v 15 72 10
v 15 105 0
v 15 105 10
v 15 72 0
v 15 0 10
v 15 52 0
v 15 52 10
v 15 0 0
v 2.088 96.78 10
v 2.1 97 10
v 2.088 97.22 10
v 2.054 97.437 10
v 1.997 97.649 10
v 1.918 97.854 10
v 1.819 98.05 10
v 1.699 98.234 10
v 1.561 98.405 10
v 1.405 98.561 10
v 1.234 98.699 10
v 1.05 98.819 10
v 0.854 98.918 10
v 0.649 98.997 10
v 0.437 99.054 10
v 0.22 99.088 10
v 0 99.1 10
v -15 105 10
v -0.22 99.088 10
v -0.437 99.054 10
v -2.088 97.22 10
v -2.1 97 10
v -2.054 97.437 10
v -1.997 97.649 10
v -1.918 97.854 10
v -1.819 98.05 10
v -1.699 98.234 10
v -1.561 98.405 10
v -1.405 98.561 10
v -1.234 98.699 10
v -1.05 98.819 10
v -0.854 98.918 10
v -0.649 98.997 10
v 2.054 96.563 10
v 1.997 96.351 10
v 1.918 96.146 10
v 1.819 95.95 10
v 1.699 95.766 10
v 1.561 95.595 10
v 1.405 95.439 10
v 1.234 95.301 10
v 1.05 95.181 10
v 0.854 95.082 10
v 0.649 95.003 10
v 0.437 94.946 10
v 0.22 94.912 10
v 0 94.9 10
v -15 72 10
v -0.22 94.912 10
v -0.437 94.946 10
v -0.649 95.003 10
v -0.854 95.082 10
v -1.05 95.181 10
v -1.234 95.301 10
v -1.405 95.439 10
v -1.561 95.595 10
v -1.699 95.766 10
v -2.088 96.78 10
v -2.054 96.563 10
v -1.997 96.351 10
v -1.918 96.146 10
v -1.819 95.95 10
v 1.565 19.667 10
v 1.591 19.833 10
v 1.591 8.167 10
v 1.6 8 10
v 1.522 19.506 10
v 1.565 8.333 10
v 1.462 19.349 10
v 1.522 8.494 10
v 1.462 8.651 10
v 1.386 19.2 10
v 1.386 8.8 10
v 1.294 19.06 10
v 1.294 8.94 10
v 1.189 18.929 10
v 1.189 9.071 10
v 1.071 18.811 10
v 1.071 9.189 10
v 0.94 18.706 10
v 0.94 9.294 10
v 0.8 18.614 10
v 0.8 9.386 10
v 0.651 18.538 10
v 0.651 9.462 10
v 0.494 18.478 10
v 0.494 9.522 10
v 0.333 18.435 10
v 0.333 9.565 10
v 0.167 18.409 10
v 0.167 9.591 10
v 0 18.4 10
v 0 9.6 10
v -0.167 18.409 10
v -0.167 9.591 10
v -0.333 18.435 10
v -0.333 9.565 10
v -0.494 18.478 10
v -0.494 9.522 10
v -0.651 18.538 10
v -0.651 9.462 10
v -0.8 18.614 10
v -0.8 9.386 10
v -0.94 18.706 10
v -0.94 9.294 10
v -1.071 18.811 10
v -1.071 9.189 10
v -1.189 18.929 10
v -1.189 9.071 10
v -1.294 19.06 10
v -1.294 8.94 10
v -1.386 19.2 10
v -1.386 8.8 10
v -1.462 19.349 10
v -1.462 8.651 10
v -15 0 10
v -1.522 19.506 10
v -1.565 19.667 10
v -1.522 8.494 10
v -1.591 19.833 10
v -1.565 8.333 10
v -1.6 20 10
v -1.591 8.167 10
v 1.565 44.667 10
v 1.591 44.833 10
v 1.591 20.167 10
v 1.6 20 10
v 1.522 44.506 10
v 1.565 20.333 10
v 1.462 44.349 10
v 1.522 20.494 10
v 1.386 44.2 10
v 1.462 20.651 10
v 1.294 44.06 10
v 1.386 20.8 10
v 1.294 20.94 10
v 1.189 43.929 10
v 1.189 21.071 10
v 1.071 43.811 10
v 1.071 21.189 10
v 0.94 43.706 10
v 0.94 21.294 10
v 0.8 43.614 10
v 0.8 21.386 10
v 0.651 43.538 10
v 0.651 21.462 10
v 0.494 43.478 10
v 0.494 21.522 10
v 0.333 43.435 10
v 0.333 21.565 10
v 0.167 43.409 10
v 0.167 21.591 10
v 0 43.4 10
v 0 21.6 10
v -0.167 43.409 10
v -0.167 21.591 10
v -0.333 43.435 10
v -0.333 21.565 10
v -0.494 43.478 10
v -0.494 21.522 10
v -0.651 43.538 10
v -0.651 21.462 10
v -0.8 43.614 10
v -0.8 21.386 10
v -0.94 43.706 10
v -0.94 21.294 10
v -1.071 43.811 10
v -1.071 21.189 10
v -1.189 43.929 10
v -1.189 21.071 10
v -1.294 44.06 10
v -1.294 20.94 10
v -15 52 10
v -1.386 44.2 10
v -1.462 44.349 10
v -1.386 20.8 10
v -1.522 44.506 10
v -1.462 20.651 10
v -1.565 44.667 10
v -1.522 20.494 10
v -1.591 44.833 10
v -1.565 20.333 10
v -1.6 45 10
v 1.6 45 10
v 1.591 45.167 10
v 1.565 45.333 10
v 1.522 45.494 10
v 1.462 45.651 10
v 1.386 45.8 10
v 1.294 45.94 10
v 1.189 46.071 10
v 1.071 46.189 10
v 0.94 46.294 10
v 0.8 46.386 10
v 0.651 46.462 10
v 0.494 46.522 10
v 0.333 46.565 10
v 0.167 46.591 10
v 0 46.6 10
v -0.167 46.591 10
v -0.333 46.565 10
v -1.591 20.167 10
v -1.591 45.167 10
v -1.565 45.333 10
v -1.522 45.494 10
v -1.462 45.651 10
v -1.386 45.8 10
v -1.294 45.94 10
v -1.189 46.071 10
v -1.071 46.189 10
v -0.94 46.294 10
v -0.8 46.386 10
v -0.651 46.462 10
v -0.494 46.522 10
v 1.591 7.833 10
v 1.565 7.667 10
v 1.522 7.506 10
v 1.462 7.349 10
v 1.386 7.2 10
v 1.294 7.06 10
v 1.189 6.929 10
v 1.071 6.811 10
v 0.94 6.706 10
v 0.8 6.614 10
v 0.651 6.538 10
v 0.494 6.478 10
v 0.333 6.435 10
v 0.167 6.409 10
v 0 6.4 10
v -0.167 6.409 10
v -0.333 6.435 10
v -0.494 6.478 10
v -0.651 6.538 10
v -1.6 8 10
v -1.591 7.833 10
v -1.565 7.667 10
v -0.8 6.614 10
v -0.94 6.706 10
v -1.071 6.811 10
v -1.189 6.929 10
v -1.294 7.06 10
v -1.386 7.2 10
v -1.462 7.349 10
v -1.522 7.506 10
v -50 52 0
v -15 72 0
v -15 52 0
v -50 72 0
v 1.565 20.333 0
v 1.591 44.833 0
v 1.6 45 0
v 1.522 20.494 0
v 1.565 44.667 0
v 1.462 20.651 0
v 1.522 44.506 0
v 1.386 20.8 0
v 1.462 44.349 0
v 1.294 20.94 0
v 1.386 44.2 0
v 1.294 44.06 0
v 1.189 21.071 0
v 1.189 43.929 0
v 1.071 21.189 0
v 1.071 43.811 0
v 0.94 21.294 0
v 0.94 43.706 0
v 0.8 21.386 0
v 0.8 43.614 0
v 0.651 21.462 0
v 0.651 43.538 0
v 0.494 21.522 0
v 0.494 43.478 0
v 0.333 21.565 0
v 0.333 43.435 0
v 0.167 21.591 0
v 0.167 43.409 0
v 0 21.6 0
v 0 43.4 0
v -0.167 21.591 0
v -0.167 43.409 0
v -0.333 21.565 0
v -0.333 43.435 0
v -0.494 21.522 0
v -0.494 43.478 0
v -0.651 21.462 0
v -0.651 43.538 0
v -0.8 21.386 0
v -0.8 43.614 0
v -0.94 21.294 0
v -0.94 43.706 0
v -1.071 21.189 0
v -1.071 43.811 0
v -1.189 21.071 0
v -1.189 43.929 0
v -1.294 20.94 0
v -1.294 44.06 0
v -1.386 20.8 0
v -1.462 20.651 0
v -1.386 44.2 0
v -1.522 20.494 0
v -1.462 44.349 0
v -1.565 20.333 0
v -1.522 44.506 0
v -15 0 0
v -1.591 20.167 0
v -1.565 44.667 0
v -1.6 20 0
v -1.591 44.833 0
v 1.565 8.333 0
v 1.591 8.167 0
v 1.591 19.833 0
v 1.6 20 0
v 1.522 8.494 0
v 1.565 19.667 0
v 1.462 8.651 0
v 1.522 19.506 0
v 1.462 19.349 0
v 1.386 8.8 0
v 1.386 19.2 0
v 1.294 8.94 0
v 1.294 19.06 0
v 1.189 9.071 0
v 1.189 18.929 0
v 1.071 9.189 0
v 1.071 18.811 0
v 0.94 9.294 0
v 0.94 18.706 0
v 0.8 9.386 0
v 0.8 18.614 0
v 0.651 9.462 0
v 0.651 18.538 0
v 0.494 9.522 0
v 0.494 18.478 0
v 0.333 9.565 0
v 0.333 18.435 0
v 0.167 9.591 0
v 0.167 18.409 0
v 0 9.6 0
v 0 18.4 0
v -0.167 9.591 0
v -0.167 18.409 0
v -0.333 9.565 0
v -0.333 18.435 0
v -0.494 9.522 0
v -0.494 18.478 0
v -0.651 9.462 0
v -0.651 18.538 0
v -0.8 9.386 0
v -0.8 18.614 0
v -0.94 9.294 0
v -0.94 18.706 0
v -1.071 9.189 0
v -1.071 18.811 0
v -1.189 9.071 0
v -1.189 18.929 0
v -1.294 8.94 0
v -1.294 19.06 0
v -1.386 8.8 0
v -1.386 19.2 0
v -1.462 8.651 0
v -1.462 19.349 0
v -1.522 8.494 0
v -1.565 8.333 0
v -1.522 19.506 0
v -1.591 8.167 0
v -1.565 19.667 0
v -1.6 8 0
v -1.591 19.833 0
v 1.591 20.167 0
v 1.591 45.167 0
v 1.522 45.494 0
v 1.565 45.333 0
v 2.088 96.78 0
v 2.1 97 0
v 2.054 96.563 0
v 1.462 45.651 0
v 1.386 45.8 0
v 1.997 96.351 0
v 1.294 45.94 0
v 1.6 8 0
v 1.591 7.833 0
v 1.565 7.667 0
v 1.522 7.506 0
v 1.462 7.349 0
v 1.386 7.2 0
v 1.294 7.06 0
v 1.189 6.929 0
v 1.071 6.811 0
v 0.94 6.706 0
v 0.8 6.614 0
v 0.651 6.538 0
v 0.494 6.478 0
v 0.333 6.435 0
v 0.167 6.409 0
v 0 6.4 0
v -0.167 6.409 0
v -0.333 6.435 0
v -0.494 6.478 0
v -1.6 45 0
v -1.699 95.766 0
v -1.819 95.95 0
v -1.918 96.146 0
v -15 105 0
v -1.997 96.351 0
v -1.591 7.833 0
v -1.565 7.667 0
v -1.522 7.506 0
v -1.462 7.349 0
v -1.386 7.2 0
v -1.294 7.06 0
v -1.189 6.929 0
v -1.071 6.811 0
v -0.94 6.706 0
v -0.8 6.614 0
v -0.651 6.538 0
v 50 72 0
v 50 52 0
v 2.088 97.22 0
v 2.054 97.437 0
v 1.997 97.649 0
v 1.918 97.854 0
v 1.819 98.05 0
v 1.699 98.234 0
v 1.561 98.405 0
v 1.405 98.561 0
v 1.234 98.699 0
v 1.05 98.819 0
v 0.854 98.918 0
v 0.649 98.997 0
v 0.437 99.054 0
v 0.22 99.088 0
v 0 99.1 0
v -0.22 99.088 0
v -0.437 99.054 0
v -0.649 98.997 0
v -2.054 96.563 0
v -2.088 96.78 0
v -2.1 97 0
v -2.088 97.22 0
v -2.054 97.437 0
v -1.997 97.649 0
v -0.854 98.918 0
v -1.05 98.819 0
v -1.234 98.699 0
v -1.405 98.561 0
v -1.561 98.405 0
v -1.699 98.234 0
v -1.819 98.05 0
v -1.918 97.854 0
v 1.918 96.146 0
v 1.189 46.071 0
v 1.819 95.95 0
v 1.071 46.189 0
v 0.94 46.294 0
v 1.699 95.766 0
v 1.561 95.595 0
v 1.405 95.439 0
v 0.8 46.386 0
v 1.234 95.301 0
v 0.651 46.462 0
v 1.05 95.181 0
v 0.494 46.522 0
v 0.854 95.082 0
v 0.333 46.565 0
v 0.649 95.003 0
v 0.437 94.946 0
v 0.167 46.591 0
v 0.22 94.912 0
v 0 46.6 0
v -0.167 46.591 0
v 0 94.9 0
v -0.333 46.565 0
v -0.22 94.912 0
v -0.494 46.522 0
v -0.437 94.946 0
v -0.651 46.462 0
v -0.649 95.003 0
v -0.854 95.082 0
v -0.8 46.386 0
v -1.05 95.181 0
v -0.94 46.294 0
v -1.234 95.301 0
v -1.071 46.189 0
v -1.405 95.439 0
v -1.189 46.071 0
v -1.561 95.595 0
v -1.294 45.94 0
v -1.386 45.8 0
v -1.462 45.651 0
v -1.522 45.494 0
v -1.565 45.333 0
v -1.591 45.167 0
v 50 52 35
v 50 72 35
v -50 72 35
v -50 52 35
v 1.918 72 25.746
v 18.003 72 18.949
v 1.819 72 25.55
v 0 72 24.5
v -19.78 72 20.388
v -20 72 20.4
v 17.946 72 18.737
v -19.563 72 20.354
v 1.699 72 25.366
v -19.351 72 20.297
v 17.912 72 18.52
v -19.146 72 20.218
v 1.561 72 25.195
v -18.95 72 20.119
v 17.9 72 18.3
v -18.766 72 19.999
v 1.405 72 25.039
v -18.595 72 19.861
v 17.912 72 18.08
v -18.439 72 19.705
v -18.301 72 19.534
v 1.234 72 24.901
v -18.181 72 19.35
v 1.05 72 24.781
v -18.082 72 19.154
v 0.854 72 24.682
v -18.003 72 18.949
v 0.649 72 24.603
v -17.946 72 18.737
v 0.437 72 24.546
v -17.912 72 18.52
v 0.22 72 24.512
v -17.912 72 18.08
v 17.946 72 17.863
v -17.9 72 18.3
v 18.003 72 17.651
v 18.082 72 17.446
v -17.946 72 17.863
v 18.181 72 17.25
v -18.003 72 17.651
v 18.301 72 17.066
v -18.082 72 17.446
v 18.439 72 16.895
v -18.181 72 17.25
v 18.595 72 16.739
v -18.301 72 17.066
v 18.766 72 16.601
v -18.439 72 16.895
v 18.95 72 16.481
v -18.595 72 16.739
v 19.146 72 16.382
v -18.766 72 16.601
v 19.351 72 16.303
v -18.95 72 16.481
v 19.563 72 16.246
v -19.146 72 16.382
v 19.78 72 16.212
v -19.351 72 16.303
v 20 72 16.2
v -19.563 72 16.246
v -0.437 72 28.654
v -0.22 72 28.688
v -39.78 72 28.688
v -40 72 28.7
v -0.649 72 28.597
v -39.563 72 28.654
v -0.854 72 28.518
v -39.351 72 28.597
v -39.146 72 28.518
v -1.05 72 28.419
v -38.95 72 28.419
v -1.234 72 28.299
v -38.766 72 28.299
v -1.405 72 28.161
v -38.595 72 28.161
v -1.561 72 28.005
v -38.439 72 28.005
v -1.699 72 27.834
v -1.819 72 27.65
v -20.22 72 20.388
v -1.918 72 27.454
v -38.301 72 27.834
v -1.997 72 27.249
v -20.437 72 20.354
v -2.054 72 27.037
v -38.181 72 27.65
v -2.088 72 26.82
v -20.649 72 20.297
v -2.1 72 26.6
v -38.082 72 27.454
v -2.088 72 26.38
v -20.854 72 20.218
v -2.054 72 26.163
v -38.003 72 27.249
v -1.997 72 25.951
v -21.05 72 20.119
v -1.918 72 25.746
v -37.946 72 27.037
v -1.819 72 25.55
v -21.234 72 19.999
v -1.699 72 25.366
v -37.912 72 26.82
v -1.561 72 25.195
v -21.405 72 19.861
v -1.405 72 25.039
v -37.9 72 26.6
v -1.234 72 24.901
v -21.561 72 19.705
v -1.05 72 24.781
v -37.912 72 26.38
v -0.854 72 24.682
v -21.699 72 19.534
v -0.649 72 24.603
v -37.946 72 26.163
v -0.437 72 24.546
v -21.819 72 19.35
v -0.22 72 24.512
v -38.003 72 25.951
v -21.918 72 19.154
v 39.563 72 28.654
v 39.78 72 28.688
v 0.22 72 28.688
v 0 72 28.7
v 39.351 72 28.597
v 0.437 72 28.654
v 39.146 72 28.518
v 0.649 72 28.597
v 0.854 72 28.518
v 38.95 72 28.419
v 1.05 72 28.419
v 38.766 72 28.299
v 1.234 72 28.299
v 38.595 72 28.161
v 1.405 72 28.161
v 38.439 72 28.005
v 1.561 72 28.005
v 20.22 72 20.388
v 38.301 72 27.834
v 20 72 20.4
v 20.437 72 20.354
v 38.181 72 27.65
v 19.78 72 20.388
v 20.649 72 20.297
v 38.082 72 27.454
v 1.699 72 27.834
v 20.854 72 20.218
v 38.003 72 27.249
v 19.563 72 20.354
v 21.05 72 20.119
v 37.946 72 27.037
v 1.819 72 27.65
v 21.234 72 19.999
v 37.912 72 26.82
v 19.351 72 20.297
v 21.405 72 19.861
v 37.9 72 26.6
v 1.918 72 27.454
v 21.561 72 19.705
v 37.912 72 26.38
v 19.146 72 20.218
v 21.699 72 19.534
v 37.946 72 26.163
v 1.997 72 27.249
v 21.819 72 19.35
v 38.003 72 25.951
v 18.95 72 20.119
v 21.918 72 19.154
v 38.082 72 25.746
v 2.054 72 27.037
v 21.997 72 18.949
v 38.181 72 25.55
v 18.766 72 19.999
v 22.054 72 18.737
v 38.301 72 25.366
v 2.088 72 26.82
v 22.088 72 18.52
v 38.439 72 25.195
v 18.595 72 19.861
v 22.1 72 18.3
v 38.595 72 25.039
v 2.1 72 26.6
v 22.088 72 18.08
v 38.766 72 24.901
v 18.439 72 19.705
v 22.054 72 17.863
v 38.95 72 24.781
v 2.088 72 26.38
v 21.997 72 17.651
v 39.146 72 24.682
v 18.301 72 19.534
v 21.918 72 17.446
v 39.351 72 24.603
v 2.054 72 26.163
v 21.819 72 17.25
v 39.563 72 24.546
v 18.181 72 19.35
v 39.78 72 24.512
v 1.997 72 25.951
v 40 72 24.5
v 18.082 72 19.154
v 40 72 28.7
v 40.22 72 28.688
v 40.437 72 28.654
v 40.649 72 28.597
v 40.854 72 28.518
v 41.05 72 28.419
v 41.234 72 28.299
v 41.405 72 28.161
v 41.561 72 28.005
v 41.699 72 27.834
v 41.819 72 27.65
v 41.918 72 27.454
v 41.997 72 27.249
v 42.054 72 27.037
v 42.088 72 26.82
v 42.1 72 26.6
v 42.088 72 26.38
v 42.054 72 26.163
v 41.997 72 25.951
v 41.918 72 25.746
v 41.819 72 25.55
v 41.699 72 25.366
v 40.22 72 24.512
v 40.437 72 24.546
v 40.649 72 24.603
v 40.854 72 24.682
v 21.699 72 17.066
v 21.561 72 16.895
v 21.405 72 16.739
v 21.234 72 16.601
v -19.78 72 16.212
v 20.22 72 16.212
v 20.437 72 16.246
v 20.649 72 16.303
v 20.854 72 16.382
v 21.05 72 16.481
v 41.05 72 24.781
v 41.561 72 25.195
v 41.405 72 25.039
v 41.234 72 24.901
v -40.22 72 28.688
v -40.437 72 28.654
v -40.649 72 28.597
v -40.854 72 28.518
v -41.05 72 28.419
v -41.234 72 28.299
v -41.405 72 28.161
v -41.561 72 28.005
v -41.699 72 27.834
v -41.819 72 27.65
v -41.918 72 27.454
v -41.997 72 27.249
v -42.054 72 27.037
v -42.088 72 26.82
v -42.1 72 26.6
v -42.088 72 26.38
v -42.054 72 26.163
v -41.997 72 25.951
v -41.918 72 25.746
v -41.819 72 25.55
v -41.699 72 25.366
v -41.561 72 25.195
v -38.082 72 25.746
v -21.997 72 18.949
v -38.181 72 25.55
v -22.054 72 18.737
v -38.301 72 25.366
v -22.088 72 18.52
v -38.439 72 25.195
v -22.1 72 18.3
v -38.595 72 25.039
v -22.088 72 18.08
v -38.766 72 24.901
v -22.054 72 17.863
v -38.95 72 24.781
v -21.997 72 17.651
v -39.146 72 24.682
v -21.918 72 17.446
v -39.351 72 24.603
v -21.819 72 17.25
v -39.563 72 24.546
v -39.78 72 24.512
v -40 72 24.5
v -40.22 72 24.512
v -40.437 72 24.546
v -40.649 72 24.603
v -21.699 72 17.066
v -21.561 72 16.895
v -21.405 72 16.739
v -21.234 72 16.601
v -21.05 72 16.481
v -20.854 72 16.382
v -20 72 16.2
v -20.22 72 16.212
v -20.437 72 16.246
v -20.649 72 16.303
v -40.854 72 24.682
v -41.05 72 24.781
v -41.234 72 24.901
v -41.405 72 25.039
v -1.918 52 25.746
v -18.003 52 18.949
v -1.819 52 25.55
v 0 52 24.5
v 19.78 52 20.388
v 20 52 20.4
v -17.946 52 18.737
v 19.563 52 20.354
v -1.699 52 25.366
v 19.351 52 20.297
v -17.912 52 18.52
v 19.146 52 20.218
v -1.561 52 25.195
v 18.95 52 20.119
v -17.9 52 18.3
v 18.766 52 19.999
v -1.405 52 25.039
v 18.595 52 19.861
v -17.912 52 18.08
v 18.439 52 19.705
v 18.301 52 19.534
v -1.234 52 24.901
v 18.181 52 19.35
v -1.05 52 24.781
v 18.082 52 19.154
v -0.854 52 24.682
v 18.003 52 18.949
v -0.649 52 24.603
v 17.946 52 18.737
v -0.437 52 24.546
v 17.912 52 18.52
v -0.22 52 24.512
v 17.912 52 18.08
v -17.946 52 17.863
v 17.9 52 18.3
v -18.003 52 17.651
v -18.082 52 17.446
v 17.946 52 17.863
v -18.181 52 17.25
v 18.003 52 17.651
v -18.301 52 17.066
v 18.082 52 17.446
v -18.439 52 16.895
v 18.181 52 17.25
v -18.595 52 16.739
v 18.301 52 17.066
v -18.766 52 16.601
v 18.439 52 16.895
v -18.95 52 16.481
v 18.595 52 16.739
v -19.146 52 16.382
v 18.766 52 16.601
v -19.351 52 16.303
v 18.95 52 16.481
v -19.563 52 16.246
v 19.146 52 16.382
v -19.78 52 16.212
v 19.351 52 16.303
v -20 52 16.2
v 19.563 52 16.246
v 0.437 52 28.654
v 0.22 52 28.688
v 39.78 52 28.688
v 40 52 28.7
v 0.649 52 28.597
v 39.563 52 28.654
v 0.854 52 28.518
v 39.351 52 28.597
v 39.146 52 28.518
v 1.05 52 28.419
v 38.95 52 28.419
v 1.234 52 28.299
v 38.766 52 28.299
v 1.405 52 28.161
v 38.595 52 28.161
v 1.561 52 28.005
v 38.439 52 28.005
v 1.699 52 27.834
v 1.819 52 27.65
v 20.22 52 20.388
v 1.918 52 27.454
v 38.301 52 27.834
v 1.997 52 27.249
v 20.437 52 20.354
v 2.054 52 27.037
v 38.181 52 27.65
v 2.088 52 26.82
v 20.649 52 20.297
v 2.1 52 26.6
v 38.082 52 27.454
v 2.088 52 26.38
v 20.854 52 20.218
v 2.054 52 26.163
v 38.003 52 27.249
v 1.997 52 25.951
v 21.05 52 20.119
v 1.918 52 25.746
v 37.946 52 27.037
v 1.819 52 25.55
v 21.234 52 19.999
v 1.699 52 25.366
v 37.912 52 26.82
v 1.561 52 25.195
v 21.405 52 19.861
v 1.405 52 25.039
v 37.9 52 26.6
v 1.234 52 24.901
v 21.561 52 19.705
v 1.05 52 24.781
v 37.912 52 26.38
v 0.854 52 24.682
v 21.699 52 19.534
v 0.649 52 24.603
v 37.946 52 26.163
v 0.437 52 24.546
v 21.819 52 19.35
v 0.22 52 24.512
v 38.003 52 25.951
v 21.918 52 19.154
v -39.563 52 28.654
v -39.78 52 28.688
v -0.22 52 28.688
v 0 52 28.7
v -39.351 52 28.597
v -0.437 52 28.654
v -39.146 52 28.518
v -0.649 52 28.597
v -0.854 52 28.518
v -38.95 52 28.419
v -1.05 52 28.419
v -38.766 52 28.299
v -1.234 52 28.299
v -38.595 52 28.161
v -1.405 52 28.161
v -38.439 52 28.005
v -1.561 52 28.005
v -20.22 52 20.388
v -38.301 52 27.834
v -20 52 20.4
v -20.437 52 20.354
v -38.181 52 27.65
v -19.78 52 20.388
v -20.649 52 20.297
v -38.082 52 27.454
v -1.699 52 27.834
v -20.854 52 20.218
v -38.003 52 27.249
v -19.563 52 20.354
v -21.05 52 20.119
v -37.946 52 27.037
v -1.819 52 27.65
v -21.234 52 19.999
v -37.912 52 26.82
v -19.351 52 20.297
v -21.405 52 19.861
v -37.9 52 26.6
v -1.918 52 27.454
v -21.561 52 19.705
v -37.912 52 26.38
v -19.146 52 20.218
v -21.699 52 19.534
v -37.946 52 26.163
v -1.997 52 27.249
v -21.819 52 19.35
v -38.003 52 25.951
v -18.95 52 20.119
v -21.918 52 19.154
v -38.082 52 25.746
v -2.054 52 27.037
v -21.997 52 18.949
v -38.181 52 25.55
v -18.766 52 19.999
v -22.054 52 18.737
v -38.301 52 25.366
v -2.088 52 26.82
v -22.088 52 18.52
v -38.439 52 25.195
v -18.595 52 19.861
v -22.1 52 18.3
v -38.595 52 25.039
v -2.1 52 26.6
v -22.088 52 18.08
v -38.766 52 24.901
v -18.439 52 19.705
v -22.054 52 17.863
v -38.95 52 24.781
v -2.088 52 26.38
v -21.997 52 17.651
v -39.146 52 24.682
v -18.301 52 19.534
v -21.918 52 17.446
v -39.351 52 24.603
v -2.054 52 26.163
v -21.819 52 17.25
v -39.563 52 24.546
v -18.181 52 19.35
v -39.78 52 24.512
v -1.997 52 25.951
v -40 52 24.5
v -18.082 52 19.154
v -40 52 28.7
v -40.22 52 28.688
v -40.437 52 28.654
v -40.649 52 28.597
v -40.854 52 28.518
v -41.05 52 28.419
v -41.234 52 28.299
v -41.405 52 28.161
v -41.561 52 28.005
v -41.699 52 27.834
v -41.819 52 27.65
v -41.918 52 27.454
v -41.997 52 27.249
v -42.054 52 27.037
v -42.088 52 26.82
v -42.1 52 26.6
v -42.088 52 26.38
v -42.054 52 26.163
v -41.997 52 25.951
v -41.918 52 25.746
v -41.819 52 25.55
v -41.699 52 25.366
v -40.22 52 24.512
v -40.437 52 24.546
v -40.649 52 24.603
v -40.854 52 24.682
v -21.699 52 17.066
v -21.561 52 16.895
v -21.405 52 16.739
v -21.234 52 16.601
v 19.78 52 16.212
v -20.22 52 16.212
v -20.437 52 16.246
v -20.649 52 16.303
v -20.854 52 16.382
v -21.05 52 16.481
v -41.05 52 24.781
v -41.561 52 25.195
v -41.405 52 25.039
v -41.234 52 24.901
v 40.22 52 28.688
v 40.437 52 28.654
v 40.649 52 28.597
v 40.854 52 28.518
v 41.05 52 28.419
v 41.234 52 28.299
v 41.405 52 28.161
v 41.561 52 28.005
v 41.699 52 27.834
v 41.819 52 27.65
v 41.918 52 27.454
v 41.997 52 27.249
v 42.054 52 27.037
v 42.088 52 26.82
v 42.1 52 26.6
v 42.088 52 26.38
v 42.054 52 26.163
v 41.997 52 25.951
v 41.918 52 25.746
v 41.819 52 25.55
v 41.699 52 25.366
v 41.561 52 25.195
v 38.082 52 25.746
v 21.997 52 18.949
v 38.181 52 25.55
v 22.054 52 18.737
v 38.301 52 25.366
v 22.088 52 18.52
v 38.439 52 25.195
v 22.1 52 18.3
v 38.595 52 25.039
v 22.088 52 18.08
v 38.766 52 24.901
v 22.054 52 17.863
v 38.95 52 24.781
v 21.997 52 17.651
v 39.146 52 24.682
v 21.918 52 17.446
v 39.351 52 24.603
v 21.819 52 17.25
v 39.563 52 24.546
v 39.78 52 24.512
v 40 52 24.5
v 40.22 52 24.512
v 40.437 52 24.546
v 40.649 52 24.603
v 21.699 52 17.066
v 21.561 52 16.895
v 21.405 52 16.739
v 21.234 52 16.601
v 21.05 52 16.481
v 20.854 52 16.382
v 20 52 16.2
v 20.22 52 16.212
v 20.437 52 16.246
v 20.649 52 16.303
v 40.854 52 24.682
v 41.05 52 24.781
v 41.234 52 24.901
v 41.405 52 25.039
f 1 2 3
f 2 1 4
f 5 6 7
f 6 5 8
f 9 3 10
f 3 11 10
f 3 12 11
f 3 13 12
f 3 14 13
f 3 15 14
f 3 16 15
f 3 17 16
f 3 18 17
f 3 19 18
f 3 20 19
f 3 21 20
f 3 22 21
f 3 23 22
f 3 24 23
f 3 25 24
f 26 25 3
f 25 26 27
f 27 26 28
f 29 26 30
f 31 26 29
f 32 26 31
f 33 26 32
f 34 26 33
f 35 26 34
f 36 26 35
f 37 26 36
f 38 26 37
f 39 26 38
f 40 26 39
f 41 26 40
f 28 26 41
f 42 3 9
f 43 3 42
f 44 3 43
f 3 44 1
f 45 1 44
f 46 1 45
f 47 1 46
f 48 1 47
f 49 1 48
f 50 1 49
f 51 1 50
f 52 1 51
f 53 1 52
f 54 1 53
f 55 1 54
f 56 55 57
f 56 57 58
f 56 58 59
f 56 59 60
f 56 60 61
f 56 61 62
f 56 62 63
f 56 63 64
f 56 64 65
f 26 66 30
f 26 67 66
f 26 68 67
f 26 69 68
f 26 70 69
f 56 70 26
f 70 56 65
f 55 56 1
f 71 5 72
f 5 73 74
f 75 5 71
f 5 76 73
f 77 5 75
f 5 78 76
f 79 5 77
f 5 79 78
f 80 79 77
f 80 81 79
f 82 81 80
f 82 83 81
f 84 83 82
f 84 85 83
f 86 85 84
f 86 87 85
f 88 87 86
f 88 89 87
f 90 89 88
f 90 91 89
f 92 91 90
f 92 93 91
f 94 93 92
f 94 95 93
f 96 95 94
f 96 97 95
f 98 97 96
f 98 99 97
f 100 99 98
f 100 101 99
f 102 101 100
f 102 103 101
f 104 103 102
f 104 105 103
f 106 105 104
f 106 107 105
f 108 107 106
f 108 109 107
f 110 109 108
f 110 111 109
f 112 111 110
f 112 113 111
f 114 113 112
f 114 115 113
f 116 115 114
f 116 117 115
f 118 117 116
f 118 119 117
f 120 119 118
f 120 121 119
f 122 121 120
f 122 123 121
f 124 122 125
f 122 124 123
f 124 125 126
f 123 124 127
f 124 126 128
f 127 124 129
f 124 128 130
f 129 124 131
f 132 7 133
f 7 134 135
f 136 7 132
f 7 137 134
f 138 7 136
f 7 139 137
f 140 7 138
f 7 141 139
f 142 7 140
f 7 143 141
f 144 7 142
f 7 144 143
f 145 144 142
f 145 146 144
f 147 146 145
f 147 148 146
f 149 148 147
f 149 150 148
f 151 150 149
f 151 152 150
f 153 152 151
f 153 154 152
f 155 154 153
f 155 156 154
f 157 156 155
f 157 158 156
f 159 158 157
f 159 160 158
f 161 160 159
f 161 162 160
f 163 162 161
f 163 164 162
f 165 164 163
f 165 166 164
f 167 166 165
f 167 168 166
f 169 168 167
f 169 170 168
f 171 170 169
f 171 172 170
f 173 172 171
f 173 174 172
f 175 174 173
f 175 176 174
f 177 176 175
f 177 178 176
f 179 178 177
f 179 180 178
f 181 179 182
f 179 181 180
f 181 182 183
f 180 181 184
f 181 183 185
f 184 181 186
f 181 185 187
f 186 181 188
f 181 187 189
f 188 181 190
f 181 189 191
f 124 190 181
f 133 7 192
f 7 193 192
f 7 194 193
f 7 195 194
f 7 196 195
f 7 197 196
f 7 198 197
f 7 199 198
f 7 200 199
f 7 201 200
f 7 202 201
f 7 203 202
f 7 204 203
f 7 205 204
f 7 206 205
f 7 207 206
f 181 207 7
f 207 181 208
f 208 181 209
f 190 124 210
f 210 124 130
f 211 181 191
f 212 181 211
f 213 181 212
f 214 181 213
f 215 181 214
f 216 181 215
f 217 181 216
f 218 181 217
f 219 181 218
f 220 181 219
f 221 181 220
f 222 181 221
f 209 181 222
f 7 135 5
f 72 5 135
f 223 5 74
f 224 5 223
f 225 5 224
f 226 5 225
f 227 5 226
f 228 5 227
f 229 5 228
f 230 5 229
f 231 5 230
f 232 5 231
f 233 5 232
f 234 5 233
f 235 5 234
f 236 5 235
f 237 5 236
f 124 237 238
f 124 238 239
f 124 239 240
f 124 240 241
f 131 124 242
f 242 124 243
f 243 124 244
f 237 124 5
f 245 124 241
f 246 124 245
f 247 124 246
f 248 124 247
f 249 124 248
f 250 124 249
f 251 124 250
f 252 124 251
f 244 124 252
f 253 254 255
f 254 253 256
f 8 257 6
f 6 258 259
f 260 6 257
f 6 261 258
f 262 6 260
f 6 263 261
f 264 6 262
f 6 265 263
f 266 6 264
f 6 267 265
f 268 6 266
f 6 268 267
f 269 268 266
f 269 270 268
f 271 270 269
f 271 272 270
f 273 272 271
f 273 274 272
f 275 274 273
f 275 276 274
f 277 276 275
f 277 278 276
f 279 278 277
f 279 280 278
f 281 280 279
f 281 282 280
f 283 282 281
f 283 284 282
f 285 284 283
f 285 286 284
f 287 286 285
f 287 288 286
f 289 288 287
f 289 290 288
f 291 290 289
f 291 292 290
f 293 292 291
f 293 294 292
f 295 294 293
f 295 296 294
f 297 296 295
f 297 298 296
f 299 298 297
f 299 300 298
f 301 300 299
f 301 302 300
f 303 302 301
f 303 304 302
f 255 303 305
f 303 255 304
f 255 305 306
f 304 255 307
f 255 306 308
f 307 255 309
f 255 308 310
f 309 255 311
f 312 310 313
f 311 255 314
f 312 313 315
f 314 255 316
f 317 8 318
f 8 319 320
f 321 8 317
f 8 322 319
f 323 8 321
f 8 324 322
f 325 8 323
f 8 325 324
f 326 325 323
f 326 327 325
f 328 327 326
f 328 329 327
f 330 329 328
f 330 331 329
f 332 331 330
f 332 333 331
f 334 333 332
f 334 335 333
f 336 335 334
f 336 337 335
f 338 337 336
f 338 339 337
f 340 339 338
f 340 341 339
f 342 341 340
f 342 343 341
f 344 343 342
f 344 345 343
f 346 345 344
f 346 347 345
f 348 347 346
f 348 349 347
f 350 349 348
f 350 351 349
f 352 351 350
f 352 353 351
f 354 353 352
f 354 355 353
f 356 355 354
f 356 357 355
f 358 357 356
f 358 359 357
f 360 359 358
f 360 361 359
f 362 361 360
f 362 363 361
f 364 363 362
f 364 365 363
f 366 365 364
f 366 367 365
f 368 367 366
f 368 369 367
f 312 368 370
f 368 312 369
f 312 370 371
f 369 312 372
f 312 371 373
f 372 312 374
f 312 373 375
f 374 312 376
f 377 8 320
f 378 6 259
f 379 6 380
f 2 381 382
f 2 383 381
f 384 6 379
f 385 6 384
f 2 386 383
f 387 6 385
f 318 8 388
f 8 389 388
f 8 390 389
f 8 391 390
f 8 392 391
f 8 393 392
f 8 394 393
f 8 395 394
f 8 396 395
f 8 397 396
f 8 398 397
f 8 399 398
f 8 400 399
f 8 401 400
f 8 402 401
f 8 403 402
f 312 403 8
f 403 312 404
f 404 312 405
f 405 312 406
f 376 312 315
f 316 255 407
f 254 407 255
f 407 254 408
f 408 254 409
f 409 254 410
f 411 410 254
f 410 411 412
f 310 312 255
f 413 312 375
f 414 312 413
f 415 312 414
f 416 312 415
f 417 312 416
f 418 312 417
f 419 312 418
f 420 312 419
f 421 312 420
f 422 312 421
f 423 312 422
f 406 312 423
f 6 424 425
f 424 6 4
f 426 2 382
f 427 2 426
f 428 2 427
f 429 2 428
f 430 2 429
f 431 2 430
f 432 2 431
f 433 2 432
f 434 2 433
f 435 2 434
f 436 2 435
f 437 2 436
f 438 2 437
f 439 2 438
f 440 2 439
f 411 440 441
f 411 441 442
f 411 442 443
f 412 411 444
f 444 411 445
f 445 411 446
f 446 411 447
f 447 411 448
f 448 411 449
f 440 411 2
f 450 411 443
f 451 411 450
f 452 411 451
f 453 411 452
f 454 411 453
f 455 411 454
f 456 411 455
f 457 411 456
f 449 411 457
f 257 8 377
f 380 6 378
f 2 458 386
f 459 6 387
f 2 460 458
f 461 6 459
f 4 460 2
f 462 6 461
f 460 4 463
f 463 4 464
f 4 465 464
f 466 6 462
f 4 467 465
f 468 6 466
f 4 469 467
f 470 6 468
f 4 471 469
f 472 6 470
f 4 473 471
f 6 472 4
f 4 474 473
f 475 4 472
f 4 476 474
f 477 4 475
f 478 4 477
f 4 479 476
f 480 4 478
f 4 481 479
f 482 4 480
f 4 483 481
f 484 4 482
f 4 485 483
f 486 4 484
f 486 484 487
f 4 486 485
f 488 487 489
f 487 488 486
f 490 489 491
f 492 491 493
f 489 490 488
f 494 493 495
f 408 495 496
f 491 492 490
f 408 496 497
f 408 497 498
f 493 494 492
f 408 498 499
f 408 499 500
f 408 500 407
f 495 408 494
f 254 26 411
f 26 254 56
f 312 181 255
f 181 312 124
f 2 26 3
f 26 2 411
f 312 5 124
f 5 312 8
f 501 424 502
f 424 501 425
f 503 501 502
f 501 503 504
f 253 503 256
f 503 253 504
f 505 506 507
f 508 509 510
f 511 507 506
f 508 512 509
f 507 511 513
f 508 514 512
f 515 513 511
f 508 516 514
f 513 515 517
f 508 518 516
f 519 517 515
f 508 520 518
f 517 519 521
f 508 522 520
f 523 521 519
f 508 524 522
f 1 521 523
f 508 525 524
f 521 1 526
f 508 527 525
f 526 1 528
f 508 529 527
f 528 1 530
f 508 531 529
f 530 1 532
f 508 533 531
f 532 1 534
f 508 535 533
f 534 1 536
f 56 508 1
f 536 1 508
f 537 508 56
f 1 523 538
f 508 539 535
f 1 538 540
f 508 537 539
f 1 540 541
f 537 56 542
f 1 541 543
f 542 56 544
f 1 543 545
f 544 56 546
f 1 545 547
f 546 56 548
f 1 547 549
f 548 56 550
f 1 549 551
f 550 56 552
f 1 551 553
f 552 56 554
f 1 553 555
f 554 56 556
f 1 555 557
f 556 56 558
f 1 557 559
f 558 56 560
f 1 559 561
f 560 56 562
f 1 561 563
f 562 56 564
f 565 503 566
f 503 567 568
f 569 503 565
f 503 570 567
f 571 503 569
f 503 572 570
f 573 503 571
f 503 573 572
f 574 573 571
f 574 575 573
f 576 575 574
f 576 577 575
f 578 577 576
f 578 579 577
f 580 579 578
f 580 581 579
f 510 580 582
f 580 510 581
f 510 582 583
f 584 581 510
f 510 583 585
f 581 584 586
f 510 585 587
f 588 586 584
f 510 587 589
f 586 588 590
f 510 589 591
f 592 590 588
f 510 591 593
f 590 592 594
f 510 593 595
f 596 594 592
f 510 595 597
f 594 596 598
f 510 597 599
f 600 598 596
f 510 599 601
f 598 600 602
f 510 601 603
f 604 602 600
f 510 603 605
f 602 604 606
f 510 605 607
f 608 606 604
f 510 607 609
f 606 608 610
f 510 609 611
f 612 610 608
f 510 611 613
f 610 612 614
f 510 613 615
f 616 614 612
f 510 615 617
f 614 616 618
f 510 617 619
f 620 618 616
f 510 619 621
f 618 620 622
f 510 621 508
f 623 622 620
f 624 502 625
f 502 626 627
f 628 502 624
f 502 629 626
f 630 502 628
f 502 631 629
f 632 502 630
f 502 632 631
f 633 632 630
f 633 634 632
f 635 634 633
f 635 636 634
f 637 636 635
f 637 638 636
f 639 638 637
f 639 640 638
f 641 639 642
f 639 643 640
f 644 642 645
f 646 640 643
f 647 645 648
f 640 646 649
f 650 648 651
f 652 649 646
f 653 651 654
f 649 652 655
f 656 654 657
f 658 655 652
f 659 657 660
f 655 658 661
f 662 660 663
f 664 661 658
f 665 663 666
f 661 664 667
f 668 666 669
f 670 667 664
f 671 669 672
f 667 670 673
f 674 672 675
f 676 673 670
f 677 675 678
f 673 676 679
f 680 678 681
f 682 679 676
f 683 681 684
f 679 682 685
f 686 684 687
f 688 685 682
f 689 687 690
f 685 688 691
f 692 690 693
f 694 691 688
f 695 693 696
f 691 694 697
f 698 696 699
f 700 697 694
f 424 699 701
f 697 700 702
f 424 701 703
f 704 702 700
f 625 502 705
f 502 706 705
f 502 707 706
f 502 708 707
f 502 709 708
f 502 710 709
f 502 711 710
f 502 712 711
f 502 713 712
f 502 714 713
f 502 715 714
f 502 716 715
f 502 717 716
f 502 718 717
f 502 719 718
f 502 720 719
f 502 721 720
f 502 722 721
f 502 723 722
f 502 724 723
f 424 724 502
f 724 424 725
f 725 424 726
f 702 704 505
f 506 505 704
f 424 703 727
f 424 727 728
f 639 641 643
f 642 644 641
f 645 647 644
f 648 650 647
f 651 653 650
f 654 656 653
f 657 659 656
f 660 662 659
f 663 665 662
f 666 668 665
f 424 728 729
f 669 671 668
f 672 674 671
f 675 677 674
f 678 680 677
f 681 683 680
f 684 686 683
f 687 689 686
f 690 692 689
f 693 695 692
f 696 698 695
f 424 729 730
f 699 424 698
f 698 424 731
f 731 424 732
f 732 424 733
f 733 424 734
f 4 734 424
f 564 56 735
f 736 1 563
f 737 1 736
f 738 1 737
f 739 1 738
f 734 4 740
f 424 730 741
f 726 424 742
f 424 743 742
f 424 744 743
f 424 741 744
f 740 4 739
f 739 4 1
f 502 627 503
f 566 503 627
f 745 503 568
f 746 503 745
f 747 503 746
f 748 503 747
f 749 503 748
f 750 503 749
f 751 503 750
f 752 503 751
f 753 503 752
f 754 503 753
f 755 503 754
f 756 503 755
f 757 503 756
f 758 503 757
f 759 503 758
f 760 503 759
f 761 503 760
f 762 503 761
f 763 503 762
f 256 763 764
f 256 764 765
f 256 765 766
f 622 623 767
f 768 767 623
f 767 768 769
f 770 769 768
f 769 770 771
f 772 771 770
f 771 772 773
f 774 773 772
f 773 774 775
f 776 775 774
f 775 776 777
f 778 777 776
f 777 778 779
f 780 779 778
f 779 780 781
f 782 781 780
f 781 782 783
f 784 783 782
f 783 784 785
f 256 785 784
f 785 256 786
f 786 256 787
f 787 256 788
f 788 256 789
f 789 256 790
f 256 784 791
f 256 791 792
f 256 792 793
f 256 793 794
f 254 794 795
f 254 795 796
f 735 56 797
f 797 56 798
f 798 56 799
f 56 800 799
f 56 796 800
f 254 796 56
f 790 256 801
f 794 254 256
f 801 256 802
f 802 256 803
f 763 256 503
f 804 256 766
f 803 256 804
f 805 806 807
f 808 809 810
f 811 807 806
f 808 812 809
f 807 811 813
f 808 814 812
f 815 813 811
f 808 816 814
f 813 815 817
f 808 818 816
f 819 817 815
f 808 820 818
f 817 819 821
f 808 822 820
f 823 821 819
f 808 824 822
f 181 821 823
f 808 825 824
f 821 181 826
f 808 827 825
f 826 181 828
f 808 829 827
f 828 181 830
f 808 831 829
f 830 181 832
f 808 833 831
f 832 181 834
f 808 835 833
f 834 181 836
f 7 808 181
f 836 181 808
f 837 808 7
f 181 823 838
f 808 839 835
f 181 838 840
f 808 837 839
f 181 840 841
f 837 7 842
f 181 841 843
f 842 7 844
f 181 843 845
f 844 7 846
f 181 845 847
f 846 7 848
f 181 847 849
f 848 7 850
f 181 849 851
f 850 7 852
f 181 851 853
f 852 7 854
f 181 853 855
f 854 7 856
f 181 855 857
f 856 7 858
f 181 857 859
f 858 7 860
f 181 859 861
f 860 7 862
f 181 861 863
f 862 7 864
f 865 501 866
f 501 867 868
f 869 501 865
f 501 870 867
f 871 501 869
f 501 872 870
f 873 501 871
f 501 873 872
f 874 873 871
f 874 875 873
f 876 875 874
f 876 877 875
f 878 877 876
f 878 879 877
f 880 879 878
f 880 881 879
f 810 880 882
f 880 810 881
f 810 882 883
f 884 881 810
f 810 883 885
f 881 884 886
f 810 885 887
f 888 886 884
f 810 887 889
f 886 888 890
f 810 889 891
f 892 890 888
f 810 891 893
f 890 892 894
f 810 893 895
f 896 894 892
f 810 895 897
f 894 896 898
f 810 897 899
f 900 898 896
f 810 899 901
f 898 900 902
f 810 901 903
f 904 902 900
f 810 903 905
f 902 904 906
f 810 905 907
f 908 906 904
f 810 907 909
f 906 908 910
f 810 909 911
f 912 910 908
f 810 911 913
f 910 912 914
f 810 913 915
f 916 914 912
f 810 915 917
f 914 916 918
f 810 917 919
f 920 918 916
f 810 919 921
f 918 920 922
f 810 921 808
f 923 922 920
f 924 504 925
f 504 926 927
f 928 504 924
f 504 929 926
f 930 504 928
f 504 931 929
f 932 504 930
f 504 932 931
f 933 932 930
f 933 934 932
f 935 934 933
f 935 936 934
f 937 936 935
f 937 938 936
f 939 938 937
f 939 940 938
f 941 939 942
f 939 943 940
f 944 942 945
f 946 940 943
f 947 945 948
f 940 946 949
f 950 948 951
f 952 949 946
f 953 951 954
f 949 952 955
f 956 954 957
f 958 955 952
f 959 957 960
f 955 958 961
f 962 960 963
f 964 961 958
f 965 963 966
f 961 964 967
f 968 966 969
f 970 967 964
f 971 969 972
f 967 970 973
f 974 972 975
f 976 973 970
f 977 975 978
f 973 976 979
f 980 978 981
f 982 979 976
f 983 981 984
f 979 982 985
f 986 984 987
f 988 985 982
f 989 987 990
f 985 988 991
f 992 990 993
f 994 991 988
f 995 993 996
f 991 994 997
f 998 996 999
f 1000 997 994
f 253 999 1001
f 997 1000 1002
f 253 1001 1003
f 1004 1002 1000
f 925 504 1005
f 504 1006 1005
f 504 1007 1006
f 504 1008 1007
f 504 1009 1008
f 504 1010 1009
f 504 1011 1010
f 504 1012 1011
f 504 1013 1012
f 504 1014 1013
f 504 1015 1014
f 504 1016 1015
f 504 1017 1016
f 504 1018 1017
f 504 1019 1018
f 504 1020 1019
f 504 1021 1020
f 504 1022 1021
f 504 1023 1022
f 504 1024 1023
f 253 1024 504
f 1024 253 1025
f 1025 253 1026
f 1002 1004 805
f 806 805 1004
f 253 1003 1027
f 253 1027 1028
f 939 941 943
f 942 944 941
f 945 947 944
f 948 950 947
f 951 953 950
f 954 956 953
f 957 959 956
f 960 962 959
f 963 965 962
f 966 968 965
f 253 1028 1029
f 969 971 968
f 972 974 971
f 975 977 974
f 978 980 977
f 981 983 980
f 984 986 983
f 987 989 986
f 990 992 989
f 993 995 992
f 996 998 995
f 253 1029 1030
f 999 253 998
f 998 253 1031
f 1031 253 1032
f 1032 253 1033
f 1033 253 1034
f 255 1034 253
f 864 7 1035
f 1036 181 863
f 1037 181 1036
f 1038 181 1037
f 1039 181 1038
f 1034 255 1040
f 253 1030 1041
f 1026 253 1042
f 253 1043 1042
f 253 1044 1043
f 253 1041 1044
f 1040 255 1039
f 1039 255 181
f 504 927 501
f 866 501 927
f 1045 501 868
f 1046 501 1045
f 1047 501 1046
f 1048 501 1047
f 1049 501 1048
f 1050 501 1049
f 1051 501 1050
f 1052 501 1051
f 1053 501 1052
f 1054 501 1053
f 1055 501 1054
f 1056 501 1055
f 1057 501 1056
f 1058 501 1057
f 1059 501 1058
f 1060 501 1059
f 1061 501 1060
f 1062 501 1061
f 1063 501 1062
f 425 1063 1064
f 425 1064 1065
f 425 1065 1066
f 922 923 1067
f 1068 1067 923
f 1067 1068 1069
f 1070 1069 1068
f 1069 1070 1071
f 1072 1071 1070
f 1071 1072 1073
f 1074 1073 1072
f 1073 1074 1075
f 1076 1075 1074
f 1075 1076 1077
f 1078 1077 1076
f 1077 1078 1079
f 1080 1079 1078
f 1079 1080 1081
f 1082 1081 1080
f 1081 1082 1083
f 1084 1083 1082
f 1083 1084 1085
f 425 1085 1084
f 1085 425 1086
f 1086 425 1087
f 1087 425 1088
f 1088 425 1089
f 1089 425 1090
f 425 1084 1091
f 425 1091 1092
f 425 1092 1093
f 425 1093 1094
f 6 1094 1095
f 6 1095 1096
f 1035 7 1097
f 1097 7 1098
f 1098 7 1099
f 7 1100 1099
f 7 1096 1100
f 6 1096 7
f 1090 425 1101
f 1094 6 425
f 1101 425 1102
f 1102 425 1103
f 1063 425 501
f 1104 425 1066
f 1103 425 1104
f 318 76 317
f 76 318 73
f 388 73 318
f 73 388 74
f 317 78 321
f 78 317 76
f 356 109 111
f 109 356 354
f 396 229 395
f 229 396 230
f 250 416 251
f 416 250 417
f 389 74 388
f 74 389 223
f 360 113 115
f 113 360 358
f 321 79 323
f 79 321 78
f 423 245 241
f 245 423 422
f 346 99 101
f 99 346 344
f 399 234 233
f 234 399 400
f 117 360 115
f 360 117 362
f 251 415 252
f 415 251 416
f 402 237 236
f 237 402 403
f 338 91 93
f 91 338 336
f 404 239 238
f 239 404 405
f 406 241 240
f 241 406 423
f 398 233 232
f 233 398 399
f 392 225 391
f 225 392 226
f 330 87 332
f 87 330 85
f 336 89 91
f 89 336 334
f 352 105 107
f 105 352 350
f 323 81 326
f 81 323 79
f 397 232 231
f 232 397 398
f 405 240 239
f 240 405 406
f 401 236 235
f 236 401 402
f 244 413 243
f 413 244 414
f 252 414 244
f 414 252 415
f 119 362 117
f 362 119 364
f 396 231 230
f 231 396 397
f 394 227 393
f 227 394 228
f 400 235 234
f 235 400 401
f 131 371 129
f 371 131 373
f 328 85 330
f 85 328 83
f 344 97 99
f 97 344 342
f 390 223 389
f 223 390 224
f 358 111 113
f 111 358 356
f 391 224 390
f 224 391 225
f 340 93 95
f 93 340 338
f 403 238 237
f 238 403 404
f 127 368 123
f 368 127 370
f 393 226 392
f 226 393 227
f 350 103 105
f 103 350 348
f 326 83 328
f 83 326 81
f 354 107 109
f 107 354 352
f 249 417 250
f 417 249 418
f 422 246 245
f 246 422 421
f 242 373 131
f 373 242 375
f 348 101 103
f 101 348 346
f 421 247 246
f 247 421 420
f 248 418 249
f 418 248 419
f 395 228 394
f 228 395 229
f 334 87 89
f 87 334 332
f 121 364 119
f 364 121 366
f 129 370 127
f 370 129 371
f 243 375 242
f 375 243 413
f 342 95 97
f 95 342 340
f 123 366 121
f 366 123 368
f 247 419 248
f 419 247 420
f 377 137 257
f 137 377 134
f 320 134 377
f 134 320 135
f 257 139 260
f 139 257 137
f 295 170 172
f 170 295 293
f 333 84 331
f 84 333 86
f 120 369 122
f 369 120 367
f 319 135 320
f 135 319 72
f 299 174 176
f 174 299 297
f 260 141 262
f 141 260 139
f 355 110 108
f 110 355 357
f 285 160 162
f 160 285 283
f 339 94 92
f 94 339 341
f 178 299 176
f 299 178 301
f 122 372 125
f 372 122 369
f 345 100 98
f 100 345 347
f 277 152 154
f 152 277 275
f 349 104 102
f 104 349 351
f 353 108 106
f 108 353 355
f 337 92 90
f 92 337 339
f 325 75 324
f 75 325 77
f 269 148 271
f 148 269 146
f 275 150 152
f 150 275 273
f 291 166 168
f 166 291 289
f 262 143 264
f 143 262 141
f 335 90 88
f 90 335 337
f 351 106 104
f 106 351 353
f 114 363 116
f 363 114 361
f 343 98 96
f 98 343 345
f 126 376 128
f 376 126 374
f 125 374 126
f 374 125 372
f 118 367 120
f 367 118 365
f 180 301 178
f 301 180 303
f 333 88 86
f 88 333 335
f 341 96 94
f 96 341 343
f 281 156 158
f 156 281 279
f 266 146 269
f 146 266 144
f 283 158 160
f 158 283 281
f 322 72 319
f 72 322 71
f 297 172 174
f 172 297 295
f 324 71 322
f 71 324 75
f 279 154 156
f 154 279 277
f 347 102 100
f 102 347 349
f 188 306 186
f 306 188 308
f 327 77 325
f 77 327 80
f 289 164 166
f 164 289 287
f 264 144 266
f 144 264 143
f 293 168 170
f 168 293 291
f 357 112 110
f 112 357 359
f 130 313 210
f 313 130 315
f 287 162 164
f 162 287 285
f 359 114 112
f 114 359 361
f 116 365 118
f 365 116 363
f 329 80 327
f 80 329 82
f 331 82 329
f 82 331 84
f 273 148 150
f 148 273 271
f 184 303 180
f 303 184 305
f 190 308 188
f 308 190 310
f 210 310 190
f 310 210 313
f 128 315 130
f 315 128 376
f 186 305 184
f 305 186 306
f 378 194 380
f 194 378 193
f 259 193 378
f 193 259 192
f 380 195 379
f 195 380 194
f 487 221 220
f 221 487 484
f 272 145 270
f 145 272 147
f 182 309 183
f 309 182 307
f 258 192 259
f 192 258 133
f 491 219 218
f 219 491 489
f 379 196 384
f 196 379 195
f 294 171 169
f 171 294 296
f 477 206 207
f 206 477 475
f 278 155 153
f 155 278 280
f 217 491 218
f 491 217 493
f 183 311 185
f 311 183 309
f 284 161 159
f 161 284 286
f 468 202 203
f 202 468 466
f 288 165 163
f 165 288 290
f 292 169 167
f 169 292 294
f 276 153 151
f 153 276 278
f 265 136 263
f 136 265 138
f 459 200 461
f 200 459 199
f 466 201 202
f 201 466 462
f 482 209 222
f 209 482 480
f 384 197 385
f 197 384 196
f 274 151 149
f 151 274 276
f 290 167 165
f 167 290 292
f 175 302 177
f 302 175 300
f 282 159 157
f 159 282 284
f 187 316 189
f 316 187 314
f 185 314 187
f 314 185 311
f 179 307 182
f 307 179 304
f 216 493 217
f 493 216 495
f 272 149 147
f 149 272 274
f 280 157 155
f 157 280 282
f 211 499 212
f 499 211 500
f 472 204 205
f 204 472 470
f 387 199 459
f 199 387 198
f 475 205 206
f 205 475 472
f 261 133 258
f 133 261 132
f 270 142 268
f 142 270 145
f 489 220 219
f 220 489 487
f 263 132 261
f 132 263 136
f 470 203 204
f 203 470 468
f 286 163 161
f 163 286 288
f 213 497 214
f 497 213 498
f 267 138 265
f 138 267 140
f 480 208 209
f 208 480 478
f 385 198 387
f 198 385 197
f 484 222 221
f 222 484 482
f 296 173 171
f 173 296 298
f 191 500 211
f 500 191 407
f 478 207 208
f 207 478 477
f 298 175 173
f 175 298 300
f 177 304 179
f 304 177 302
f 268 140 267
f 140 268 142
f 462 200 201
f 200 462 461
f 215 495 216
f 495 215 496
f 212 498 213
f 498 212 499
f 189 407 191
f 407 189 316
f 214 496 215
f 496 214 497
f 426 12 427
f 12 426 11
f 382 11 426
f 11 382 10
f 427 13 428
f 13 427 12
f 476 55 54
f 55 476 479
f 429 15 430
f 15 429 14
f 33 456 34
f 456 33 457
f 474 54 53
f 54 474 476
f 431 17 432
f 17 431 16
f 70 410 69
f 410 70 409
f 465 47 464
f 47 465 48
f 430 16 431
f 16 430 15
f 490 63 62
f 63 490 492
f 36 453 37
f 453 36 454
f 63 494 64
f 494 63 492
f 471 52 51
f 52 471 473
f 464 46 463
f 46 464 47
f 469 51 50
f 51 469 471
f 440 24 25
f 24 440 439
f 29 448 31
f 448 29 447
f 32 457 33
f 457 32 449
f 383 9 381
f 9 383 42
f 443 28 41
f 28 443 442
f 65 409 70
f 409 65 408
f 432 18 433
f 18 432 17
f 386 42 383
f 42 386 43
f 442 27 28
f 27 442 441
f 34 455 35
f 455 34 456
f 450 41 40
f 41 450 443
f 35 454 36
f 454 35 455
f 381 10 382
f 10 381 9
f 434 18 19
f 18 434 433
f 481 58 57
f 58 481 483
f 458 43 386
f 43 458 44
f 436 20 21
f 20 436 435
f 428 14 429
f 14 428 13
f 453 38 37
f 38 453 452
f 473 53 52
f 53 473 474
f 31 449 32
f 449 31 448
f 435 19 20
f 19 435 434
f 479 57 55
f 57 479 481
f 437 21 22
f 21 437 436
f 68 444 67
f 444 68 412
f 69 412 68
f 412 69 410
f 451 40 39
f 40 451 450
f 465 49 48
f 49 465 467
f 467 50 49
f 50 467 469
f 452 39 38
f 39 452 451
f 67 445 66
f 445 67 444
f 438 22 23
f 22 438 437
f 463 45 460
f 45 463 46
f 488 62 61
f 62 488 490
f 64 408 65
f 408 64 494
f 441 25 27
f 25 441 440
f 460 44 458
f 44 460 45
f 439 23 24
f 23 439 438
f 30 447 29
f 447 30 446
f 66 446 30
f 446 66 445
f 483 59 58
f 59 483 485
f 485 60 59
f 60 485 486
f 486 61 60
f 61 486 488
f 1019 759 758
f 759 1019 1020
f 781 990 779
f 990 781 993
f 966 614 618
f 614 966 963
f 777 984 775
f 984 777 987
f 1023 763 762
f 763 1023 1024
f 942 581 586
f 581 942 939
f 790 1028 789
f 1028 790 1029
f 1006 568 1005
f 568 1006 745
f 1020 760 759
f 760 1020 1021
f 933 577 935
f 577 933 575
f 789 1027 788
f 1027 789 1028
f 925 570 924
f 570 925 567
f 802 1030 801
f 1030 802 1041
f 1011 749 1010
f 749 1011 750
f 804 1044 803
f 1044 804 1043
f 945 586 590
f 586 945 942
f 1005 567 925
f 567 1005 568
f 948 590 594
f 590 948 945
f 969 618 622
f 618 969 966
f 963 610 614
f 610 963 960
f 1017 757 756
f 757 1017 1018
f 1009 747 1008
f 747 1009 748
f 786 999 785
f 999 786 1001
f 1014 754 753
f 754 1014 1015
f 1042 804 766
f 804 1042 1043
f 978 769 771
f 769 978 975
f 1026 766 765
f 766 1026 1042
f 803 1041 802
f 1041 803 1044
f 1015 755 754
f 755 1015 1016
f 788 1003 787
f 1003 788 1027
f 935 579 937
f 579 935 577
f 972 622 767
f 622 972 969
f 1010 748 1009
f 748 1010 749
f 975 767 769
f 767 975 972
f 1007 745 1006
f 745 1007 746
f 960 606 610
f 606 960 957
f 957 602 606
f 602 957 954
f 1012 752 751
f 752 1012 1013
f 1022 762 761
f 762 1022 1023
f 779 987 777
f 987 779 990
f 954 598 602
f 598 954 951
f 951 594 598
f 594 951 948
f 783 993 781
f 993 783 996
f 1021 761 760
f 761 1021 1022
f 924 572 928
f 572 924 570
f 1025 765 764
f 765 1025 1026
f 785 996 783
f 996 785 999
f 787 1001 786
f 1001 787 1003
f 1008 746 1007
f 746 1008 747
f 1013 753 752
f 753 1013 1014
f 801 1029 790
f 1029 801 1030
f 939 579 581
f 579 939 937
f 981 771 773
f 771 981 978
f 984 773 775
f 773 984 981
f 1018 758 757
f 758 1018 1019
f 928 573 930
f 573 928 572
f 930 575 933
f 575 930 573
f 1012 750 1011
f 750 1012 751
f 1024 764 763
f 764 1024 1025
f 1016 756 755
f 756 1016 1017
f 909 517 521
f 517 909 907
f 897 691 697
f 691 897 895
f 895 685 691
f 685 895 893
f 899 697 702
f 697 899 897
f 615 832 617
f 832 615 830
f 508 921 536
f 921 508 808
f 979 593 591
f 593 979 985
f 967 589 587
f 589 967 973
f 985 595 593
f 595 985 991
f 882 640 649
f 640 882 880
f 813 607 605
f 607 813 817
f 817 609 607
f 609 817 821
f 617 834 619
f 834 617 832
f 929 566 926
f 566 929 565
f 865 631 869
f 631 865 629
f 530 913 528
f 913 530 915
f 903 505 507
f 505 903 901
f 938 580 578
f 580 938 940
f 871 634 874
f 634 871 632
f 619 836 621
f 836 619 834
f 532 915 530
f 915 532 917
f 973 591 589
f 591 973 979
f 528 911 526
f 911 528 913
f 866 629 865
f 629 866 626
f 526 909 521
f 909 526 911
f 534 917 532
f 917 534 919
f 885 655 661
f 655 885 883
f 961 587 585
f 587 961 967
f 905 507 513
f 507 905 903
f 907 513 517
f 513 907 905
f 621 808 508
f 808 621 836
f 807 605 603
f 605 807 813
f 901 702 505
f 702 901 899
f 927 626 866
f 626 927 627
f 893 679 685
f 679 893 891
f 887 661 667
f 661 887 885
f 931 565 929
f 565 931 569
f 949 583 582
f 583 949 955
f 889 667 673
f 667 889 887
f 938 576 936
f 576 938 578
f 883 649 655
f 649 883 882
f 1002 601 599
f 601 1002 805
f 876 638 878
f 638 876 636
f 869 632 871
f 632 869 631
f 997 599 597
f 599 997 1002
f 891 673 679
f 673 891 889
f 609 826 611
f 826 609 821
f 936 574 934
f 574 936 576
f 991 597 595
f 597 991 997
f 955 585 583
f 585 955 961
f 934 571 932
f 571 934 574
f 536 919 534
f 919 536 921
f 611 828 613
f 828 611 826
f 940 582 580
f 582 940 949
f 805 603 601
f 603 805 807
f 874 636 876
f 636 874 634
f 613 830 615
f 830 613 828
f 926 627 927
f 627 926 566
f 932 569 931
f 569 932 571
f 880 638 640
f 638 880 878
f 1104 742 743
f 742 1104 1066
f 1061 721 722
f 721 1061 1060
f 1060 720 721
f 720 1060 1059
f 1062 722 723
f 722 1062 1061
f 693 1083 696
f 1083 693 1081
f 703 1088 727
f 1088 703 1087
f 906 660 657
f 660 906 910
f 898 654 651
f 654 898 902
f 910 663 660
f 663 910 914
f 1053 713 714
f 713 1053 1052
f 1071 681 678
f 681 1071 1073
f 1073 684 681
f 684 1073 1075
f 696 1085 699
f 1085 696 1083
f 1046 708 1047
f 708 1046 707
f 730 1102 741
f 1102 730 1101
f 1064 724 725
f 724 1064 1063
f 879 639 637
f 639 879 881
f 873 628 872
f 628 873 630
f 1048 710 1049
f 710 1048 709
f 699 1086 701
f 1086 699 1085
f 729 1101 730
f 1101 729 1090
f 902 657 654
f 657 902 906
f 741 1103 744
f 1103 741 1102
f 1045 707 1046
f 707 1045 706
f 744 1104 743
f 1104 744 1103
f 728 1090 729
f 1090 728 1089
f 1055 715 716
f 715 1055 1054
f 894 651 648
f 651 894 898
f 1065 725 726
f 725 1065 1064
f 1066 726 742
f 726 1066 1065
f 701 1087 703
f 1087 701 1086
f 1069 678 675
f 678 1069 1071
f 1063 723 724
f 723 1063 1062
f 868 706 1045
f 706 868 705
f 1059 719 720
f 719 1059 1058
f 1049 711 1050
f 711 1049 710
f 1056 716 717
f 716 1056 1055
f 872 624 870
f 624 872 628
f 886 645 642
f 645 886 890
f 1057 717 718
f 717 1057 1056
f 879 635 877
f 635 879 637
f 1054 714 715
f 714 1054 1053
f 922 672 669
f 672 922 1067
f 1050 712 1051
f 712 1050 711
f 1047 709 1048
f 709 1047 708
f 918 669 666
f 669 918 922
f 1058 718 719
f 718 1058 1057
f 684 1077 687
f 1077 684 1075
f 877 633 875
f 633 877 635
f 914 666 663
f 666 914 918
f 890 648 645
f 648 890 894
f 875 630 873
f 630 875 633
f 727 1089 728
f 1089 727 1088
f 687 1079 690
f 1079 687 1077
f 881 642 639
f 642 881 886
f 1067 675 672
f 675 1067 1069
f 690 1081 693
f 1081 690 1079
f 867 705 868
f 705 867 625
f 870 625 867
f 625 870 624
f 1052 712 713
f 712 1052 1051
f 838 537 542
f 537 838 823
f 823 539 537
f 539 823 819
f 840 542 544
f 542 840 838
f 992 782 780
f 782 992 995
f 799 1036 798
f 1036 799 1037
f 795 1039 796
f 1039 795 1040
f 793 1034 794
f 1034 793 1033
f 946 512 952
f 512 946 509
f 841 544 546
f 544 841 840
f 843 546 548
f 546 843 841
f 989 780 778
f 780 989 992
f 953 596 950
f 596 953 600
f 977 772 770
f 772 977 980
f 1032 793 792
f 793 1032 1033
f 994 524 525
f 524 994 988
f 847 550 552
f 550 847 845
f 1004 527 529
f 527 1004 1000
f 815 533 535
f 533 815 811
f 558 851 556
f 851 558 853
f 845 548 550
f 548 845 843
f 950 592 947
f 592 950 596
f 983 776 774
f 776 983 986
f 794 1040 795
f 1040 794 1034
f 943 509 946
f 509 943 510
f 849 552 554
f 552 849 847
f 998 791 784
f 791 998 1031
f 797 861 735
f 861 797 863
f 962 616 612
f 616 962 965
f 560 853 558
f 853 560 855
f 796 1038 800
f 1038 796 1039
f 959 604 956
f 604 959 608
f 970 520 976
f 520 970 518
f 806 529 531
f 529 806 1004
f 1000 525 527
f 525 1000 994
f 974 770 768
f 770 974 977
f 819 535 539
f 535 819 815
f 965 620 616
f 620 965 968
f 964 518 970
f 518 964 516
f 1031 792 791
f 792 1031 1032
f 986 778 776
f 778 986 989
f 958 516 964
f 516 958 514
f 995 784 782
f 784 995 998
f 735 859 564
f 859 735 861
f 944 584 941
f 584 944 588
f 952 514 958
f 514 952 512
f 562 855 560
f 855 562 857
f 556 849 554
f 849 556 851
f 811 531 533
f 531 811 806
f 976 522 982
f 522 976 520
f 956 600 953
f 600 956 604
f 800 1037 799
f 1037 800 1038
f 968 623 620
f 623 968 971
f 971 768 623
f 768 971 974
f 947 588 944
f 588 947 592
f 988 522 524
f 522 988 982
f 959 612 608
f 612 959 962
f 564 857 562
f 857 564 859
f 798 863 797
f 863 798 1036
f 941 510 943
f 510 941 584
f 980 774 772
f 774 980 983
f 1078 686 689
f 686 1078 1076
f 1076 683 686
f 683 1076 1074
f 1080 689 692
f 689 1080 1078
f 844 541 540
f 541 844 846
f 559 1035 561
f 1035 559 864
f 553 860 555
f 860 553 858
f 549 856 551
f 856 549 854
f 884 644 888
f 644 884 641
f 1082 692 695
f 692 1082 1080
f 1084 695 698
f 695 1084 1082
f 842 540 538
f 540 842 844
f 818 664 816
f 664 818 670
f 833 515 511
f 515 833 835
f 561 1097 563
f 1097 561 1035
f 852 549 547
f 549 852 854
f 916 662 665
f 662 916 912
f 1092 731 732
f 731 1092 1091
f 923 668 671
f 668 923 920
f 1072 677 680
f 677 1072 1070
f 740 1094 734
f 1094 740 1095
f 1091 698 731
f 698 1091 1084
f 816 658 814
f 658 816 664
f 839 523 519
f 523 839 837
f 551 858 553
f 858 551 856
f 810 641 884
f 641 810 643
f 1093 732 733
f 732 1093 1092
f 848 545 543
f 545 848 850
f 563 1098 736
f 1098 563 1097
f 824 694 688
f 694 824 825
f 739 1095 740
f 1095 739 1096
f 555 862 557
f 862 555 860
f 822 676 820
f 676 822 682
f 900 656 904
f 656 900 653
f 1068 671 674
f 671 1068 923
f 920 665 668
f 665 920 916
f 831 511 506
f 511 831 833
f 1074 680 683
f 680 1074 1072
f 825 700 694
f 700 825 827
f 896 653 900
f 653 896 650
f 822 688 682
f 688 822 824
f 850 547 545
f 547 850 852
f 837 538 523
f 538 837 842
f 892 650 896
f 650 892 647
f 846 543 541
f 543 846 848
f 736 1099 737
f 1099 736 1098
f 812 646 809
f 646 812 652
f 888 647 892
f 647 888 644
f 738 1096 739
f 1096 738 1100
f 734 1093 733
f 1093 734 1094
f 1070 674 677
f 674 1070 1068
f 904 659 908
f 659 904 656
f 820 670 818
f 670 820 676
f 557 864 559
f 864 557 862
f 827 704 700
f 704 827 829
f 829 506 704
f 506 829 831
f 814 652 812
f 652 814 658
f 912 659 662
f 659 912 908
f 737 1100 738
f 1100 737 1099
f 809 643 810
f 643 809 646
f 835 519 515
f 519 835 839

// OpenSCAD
$fn=60;

depth = 105;
base_height = 10;
base_width = 30;

vertical_bracket_height = 25;
vertical_bracket_width = 100;
vertical_bracket_depth = 20;

//mounting_screw_depths = [8, 20, 45, 71, 97];
mounting_screw_depths = [8, 20, 45, 97];

module base()
{
    translate([-base_width/2, 0, 0])
    cube([base_width, depth, base_height]);
}

module screw_holes()
{
    for( y_translation = mounting_screw_depths )
    {
        translate([0, y_translation, 0])
        cylinder(d=3.2, h=base_height);
    }
    
    translate([0, mounting_screw_depths[3], 0])
    cylinder(d=4.2, h=base_height);
}

module screw_holes_2()
{
    
    
    x_translations1 = [-40, 0, 40];
    x_translations2 = [-20, 20];
    z_translation2 = 18.3;
    z_translation1 = 26.6;
    
    for( x_translation = x_translations1 )
    {
        translate([x_translation, 0, z_translation1])
        rotate([-90, 0, 0])
        cylinder(d=4.2, h=100);
    }
    
        for( x_translation = x_translations2 )
    {
        translate([x_translation, 0, z_translation2])
        rotate([-90, 0, 0])
        cylinder(d=4.2, h=100);
    }
}

module vertical()
{
    translate([-vertical_bracket_width/2, 52, 0])
    cube([vertical_bracket_width, vertical_bracket_depth, base_height + vertical_bracket_height]);
}

difference()
{
    union()
    {
        base();
        vertical();
    }
    union()
    {
        screw_holes();
        screw_holes_2();
    }
    
}
